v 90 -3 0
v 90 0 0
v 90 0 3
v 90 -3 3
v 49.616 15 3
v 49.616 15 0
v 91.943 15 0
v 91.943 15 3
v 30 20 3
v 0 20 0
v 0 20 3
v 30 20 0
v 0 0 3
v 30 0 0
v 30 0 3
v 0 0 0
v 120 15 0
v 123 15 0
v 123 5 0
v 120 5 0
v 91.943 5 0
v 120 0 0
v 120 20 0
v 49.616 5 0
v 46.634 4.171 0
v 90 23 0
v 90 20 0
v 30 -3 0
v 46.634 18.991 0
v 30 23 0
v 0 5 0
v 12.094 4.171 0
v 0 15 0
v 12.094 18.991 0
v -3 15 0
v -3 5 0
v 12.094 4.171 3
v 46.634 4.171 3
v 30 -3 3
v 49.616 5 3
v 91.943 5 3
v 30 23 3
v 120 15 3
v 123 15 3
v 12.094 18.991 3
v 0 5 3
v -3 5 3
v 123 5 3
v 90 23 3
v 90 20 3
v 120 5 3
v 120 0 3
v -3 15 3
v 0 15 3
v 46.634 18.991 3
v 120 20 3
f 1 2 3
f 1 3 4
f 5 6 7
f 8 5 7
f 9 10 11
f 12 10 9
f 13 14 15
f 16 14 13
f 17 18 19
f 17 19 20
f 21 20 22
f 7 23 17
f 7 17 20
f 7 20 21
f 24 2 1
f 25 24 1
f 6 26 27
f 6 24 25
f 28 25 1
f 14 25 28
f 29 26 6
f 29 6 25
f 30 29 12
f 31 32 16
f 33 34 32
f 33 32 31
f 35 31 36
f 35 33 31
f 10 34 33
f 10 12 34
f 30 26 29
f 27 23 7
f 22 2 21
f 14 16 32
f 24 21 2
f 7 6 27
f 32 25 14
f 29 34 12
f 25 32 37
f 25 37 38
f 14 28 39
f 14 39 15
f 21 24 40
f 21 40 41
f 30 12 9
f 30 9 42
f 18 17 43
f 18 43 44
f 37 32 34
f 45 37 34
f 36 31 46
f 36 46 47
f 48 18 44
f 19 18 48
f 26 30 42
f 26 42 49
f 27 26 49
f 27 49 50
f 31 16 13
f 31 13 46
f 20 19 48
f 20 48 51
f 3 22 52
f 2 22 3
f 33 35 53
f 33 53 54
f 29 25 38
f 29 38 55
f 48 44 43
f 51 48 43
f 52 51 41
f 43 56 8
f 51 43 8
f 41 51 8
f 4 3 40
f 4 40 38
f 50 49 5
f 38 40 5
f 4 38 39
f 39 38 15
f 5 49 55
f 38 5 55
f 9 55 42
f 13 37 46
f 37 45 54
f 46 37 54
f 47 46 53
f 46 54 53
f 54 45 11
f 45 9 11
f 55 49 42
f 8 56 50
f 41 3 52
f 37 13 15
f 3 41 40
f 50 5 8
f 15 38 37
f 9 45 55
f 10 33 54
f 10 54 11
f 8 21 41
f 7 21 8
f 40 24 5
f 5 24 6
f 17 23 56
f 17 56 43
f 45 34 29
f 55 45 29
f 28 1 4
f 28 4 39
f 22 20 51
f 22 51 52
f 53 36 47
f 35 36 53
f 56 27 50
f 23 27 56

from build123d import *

# Parameters (mm, degrees)
SKETCH1_W           = 34.539950858
SKETCH1_H           = 14.819505943
SKETCH1_W_2         = 42.327470122
SKETCH1_H_2         = 10
BOSS_EXTRUDE1_DEPTH = 3


with BuildPart() as part:
    # Sketch1 → Boss-Extrude1 (new body)
    with BuildSketch(Plane.XY):
        Polygon((0, 0), (0, 5), (-3, 5), (-3, 15), (0, 15), (0, 20), (30, 20), (30, 23), (90, 23), (90, 20), (120, 20), (120, 15), (123, 15), (123, 5), (120, 5), (120, 0), (90, 0), (90, -3), (30, -3), (30, 0), align=None)
        with Locations((29.364361229, 11.580788204)):
            Rectangle(SKETCH1_W, SKETCH1_H, mode=Mode.SUBTRACT)
        with Locations((70.779364133, 10)):
            Rectangle(SKETCH1_W_2, SKETCH1_H_2, mode=Mode.SUBTRACT)
    extrude(amount=BOSS_EXTRUDE1_DEPTH)


solid = part.part
